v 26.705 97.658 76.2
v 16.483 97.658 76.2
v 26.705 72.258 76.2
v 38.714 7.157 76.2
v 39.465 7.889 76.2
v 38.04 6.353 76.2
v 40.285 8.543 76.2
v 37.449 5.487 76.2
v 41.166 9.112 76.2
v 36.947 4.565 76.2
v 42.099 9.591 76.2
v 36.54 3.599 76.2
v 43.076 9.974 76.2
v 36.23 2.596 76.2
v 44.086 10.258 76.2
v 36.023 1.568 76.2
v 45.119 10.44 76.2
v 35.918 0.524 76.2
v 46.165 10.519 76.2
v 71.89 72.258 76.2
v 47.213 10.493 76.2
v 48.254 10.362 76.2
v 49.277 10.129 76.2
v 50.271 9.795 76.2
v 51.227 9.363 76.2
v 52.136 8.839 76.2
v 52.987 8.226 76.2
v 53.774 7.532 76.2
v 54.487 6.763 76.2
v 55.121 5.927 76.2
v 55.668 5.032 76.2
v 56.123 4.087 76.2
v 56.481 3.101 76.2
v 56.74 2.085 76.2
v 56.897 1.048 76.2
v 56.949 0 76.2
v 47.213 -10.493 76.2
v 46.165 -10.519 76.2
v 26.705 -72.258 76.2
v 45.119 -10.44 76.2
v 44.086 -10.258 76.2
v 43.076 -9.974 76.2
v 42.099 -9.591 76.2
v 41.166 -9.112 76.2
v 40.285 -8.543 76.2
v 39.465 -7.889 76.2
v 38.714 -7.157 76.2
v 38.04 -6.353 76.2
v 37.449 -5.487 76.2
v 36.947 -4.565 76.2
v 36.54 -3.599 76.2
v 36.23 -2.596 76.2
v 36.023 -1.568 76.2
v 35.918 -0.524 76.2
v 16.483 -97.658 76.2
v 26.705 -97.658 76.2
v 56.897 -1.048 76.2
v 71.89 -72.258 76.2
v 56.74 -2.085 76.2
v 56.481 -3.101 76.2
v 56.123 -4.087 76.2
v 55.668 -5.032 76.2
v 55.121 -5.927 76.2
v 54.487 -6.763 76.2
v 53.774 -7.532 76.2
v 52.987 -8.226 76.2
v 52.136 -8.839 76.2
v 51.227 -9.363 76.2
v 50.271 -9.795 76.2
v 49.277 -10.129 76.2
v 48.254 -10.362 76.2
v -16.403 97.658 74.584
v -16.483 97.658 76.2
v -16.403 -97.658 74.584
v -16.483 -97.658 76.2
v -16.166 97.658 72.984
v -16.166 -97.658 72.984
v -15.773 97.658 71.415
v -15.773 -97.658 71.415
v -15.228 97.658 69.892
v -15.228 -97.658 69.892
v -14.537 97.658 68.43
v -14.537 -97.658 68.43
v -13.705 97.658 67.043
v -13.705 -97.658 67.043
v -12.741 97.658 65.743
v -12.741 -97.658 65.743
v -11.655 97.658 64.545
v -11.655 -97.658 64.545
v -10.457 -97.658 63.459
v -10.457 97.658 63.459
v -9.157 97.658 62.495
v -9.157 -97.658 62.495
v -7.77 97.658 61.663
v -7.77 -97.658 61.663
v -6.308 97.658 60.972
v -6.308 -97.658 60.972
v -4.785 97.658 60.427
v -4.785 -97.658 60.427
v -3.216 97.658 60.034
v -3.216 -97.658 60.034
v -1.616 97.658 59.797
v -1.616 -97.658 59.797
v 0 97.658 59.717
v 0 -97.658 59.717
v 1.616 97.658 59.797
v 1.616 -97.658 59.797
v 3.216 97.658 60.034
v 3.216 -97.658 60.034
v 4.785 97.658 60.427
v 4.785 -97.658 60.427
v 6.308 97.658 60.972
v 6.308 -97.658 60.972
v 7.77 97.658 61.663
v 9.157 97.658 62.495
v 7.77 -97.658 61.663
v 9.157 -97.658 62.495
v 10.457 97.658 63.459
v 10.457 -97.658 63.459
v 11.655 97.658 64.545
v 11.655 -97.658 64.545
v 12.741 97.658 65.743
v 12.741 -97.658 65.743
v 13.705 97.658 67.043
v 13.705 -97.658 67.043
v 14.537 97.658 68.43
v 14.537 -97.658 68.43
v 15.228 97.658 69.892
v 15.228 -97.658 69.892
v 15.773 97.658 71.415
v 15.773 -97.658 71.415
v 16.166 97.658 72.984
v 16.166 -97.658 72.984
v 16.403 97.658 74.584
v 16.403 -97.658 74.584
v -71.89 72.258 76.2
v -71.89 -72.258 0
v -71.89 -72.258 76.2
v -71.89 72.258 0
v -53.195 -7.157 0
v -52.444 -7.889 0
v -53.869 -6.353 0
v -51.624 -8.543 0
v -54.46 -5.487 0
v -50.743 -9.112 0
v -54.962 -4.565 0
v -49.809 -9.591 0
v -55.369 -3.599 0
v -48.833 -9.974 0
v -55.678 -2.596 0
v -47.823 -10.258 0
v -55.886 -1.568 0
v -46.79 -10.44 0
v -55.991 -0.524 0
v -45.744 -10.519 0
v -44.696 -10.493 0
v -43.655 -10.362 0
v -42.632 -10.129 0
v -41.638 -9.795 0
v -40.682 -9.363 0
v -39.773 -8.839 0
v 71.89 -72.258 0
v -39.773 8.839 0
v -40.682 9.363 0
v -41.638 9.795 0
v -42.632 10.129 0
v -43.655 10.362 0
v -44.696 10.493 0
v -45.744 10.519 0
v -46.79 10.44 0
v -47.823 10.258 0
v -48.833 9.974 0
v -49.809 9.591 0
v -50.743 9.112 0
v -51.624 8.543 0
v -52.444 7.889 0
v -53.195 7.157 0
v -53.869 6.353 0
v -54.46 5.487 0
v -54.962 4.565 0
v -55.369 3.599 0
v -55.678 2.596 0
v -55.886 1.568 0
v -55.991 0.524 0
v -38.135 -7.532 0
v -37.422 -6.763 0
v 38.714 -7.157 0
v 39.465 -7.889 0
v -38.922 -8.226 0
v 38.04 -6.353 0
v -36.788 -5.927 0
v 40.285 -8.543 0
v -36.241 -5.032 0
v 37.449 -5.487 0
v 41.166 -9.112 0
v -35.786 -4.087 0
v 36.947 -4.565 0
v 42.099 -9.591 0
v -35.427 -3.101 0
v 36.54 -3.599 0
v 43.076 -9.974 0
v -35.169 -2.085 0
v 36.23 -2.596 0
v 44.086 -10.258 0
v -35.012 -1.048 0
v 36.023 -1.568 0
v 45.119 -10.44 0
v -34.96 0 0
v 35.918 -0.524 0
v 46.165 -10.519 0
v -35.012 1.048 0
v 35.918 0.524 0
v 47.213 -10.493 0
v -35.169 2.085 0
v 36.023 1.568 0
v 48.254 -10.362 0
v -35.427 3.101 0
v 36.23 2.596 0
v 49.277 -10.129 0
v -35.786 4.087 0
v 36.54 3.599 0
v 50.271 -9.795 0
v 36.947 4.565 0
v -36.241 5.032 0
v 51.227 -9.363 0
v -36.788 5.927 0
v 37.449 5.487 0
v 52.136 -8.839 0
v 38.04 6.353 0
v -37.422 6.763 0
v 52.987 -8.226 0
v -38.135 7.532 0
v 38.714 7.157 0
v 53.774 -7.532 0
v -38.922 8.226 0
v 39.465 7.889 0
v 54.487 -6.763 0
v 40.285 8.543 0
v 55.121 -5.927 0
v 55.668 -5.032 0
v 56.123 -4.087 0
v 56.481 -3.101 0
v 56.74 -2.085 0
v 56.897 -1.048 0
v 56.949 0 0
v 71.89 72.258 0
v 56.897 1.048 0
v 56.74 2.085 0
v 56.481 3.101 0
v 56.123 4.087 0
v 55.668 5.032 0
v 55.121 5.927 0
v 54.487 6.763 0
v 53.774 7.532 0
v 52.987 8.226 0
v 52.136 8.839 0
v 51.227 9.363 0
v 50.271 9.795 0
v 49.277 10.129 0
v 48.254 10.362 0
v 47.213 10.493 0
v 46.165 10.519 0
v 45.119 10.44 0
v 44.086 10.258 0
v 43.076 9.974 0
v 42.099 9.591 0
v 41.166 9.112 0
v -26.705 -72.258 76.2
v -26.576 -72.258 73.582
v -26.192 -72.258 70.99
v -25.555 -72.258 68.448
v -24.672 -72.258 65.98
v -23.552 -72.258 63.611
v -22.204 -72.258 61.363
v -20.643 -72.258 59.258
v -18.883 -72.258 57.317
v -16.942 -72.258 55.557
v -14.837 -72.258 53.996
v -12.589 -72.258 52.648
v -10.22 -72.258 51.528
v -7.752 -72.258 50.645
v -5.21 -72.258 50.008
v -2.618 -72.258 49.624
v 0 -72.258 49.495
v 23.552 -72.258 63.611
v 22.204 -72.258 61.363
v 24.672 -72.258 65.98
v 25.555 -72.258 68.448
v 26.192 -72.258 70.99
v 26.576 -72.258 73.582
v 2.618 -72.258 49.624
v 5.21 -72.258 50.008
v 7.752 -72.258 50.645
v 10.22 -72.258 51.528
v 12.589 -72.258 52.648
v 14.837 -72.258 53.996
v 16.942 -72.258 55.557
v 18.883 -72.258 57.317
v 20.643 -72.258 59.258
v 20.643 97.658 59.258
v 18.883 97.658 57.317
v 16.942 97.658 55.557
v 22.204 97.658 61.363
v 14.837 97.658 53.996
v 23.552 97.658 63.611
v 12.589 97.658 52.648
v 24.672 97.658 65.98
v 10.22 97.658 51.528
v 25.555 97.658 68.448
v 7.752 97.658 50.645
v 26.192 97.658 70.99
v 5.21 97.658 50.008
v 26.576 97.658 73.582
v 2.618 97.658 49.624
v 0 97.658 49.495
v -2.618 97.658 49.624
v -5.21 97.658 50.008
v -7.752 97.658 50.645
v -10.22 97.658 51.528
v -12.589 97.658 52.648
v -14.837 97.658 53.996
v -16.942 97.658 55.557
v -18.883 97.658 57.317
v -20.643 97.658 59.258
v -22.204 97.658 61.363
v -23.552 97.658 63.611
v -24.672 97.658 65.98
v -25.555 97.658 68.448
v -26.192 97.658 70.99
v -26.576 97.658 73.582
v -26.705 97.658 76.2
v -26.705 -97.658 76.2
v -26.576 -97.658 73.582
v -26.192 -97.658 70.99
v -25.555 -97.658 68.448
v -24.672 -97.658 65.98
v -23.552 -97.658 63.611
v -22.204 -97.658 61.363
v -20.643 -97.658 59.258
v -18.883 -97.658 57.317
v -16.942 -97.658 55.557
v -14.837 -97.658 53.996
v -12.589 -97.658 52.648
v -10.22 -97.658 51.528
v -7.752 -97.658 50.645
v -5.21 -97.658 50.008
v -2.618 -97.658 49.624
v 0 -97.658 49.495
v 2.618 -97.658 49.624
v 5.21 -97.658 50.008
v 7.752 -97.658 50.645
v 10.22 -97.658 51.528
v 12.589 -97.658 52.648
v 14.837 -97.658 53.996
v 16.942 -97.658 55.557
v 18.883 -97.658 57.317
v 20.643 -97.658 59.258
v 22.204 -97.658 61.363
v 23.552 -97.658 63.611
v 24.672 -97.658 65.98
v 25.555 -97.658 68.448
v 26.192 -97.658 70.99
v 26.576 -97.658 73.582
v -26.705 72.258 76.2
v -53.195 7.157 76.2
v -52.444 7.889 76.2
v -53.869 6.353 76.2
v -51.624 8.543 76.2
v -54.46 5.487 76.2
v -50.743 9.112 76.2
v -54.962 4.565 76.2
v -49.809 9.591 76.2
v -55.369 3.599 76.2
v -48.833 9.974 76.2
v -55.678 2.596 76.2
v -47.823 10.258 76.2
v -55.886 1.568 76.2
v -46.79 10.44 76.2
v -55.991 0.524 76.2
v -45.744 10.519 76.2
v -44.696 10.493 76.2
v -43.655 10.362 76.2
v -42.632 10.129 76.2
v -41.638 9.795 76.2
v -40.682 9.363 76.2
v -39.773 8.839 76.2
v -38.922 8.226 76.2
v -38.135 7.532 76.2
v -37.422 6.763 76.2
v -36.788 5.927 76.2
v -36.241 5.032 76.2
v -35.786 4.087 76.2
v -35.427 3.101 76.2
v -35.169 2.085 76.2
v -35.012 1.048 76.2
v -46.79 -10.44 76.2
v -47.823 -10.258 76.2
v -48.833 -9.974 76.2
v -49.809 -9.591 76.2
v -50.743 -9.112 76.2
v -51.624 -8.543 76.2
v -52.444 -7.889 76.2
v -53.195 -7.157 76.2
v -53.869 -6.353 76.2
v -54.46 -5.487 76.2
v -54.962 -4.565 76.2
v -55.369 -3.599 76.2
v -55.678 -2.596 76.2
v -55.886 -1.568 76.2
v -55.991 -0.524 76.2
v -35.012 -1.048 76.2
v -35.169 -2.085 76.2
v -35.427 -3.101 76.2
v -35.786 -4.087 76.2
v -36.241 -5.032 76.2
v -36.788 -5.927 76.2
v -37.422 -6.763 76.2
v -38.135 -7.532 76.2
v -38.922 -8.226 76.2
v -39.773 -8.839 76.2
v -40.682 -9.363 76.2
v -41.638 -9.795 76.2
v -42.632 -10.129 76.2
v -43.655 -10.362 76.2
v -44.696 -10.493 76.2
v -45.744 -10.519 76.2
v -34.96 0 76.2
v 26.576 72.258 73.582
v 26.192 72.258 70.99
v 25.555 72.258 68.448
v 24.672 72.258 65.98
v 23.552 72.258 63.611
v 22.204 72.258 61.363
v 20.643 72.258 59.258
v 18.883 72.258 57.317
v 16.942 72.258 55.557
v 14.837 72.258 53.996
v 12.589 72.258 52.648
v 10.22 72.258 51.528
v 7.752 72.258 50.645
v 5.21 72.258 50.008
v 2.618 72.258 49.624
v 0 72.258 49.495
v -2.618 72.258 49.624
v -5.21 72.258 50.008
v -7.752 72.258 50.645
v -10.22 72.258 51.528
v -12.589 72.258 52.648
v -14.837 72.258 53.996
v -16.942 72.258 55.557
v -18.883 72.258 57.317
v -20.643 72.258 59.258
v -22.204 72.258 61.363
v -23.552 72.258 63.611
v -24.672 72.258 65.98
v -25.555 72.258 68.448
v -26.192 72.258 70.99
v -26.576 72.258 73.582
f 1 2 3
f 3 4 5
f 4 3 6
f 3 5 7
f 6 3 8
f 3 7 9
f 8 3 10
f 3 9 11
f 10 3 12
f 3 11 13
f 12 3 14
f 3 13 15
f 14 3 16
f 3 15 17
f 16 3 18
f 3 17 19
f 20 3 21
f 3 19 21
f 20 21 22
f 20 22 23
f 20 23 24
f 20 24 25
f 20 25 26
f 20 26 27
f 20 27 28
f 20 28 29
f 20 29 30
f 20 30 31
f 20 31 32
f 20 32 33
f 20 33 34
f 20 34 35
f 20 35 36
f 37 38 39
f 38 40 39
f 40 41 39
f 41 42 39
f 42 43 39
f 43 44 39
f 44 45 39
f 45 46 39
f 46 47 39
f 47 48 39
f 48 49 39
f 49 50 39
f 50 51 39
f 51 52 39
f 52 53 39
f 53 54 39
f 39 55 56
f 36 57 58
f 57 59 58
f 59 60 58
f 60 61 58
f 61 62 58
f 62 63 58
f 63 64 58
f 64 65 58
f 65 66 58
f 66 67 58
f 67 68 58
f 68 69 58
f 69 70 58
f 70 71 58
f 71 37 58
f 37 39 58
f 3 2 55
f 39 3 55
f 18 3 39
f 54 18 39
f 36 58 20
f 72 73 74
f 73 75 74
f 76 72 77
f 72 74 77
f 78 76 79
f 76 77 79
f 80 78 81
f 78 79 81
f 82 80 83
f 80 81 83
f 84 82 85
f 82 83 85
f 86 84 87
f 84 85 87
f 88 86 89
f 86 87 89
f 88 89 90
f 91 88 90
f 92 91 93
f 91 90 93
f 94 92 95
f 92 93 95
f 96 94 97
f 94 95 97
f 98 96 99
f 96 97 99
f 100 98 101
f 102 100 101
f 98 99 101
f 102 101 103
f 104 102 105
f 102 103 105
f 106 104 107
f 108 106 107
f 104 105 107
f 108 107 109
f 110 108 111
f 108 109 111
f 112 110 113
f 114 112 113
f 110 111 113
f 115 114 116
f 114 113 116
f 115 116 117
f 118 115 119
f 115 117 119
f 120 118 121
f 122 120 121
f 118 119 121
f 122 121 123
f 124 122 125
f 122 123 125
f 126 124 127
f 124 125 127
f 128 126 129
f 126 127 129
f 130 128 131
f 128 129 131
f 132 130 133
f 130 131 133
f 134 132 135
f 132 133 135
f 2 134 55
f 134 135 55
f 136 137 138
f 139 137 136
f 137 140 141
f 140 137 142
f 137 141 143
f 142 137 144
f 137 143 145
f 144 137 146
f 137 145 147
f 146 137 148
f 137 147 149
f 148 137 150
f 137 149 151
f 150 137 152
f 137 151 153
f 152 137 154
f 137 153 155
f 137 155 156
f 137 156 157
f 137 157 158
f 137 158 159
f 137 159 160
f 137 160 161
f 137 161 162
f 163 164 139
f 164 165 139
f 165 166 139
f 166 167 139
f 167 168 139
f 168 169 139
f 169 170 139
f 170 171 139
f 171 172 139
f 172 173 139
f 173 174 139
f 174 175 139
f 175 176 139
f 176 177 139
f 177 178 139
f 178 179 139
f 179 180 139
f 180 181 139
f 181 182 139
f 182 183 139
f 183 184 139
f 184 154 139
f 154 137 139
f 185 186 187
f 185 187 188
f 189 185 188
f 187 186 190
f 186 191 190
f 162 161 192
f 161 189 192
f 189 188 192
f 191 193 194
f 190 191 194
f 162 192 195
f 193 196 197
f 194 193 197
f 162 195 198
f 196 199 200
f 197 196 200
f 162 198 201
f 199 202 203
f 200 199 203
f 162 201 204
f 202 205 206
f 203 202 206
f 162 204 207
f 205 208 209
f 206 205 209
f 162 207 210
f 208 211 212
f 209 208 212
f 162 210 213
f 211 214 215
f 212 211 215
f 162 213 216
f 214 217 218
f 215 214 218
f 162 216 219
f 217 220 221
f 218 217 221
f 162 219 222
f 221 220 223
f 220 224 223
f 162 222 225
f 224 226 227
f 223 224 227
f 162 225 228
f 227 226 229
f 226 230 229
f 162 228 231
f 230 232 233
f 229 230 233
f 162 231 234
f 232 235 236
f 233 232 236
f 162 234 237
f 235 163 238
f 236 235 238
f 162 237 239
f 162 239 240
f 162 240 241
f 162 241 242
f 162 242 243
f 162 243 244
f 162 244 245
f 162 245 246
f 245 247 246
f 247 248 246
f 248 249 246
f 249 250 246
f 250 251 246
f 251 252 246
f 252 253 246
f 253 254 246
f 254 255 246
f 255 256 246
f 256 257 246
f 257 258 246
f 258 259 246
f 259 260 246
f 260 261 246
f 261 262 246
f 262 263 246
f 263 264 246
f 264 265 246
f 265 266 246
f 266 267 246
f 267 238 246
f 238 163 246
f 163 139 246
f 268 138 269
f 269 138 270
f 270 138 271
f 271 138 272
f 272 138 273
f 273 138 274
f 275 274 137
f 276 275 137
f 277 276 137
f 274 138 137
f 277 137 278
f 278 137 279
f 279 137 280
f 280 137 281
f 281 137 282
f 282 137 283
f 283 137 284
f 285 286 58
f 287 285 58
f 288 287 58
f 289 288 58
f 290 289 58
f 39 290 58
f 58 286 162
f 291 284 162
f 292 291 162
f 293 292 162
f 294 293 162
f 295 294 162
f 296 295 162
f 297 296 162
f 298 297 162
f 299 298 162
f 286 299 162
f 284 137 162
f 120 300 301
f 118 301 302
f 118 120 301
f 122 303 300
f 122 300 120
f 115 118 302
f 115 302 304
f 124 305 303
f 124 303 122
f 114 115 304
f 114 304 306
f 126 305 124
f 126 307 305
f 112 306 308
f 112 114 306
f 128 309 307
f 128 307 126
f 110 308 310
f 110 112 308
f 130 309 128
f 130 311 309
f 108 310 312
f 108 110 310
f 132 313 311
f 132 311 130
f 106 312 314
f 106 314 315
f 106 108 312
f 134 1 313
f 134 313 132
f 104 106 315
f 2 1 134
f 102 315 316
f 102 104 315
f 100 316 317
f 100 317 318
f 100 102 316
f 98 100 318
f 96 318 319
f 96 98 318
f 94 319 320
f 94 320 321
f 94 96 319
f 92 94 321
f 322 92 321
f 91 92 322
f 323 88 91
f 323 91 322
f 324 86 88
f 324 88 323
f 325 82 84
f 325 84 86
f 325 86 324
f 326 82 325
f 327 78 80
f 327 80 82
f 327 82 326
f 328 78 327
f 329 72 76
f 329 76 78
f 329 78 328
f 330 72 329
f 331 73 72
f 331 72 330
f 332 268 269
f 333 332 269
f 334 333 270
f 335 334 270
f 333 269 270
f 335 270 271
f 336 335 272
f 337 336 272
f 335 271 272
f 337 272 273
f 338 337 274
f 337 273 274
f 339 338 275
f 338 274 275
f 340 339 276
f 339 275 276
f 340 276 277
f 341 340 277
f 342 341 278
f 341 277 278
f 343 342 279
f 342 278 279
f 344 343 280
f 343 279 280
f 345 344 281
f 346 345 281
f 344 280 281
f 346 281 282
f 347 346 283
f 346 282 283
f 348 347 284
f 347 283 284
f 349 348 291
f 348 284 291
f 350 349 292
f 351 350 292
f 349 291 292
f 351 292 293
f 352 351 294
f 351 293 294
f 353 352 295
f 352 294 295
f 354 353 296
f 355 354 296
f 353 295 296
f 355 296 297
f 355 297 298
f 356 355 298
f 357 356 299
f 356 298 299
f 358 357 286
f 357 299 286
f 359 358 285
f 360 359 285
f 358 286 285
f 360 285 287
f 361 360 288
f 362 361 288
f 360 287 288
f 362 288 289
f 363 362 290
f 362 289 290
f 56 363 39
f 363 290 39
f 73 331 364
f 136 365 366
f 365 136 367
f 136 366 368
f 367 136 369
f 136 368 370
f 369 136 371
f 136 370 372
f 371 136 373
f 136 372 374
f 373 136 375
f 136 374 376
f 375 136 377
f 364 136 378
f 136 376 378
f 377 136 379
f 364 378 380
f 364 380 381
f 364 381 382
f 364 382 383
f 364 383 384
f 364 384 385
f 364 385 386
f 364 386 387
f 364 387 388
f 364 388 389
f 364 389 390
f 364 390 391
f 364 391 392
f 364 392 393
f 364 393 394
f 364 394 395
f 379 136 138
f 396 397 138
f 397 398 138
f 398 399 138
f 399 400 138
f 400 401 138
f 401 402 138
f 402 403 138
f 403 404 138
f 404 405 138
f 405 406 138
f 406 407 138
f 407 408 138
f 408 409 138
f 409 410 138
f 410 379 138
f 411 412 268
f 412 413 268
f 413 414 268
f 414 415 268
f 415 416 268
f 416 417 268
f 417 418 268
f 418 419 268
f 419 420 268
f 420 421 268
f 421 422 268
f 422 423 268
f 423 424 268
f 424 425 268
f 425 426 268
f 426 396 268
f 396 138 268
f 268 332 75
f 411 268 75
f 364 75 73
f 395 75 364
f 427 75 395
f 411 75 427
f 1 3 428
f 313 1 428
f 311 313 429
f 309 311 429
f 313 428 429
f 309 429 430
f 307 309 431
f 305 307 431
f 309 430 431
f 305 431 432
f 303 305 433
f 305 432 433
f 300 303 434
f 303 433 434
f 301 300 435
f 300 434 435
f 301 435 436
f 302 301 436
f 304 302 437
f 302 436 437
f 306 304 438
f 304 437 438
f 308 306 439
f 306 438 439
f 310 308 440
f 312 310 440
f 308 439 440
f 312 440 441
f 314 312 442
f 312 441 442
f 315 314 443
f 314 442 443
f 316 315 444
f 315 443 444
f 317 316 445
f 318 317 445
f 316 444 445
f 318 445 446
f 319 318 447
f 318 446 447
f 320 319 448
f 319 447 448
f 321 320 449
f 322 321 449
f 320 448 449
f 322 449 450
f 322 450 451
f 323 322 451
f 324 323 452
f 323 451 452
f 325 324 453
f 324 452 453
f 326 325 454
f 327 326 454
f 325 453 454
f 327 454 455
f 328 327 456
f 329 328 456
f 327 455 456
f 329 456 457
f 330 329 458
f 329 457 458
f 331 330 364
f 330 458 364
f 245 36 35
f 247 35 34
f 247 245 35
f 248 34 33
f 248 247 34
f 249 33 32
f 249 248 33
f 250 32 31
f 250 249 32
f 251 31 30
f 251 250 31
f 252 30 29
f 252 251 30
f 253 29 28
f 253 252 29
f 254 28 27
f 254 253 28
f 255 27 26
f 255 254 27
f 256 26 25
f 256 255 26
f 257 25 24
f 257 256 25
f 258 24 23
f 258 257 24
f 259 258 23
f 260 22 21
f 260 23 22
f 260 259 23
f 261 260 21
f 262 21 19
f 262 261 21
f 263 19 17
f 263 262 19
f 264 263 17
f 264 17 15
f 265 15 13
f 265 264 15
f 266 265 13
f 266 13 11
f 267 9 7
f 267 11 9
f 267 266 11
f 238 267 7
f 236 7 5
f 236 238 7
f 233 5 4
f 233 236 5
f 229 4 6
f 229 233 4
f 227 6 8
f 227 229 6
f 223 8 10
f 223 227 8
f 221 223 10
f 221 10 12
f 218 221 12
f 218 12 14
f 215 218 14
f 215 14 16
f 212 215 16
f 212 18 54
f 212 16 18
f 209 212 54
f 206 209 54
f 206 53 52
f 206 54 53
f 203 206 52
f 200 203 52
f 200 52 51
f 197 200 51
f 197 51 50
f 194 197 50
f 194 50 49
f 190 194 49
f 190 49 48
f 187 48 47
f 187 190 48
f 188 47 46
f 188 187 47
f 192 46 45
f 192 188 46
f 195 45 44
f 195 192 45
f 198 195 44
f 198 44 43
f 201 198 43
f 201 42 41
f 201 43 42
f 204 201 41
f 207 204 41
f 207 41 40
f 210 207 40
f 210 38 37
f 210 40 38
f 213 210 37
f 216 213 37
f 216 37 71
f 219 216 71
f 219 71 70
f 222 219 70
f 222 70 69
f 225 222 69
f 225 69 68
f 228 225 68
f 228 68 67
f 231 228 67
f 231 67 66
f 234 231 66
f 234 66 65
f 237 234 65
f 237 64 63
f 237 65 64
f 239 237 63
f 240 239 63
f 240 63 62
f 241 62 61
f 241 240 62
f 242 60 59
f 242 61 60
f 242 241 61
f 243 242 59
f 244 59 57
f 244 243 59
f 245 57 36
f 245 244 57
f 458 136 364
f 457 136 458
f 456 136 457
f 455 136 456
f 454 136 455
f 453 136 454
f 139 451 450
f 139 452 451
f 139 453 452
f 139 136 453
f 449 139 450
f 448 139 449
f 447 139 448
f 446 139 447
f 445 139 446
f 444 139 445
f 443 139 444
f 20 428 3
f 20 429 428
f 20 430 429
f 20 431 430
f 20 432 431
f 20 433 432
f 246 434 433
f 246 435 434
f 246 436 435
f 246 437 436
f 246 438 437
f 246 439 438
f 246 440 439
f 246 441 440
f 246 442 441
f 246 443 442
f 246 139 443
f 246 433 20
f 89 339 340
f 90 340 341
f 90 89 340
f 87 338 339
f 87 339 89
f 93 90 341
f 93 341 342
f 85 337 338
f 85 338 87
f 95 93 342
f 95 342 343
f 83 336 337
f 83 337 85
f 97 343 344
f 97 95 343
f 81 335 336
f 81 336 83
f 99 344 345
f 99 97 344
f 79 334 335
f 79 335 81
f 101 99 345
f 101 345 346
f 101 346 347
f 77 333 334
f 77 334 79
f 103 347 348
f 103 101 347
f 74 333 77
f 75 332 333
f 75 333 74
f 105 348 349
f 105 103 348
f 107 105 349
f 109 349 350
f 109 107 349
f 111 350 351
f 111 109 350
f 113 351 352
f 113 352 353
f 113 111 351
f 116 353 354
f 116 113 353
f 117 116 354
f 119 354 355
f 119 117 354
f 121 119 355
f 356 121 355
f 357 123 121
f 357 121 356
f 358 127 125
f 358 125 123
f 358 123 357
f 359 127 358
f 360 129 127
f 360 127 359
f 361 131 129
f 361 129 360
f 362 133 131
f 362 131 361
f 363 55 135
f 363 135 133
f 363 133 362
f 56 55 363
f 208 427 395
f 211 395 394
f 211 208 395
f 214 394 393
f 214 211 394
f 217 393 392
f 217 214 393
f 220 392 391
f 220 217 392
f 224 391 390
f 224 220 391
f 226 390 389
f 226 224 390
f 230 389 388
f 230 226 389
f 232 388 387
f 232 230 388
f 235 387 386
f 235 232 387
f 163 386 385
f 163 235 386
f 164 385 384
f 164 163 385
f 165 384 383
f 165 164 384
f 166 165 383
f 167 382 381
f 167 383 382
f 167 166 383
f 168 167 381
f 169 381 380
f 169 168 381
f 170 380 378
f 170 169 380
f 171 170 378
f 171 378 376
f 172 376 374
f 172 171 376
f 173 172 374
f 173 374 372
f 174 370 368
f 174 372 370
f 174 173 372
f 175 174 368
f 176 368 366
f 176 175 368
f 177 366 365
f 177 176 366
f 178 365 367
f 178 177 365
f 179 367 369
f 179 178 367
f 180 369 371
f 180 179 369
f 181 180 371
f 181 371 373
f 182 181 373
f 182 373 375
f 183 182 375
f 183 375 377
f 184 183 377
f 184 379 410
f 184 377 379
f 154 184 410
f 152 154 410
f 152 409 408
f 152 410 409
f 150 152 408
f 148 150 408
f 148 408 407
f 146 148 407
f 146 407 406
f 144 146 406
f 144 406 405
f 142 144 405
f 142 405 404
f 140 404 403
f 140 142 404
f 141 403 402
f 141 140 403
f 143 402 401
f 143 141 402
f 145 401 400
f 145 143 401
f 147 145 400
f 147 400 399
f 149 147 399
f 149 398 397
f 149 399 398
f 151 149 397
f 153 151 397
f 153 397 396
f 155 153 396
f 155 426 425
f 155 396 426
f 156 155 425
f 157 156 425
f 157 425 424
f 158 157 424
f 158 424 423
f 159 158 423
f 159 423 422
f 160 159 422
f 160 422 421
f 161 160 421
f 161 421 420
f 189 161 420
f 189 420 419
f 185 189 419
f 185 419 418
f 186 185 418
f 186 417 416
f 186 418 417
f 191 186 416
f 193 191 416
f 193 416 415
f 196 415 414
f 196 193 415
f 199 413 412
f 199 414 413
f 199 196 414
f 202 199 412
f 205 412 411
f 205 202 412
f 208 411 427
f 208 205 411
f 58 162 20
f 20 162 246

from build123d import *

# Parameters (mm, degrees)
F0_W     = 143.7808871269
F0_H     = 144.5161998272
F1_DEPTH = 76.2
F3_DEPTH = 144.5171998272
F5_DEPTH = 25.4
F7_DEPTH = 25.4
F8_R     = 10.5219569488
F9_DEPTH = 101.6


with BuildPart() as f1:
    # F0 (on Top) → F1 (new body)
    with BuildSketch(Plane.XY):
        Rectangle(F0_W, F0_H)
    extrude(amount=F1_DEPTH)

    # F2 (on face) → F3 (cut, through all)
    with BuildSketch(Plane.XZ.offset(72.2580999136)):
        with BuildLine():
            ThreePointArc((-16.4828058332, 76.2), (0, 59.7171941668), (16.4828058332, 76.2))
            Line((16.4828058332, 76.2), (-16.4828058332, 76.2))
        make_face()
    extrude(amount=-F3_DEPTH, mode=Mode.SUBTRACT)

    # F4 (on face) → F5 (join)
    with BuildSketch(Plane.XZ.offset(72.2580999136)):
        with BuildLine():
            Line((-16.4828058332, 76.2), (-26.7050843686, 76.2))
            ThreePointArc((-26.7050843686, 76.2), (0, 49.4949156314), (26.7050843686, 76.2))
            Line((26.7050843686, 76.2), (16.4828058332, 76.2))
            ThreePointArc((16.4828058332, 76.2), (0, 59.7171941668), (-16.4828058332, 76.2))
        make_face()
    extrude(amount=F5_DEPTH)

    # F6 (on face) → F7 (join)
    with BuildSketch(Plane(origin=(0, 72.2580999136, 0), x_dir=(-1, 0, 0), z_dir=(0, 1, 0))):
        with BuildLine():
            ThreePointArc((-26.7050843686, 76.2), (0, 49.4949156314), (26.7050843686, 76.2))
            Line((26.7050843686, 76.2), (16.4828058332, 76.2))
            ThreePointArc((16.4828058332, 76.2), (0, 59.7171941668), (-16.4828058332, 76.2))
            Line((-16.4828058332, 76.2), (-26.7050843686, 76.2))
        make_face()
    extrude(amount=F7_DEPTH)

    # F8 (on Top) → F9 (cut)
    with BuildSketch(Plane.XY):
        with Locations((46.426974237, 0)):
            Circle(F8_R)
        with Locations((-45.4818941653, 0)):
            Circle(F8_R)
    extrude(amount=F9_DEPTH, mode=Mode.SUBTRACT)


solid = f1.part
